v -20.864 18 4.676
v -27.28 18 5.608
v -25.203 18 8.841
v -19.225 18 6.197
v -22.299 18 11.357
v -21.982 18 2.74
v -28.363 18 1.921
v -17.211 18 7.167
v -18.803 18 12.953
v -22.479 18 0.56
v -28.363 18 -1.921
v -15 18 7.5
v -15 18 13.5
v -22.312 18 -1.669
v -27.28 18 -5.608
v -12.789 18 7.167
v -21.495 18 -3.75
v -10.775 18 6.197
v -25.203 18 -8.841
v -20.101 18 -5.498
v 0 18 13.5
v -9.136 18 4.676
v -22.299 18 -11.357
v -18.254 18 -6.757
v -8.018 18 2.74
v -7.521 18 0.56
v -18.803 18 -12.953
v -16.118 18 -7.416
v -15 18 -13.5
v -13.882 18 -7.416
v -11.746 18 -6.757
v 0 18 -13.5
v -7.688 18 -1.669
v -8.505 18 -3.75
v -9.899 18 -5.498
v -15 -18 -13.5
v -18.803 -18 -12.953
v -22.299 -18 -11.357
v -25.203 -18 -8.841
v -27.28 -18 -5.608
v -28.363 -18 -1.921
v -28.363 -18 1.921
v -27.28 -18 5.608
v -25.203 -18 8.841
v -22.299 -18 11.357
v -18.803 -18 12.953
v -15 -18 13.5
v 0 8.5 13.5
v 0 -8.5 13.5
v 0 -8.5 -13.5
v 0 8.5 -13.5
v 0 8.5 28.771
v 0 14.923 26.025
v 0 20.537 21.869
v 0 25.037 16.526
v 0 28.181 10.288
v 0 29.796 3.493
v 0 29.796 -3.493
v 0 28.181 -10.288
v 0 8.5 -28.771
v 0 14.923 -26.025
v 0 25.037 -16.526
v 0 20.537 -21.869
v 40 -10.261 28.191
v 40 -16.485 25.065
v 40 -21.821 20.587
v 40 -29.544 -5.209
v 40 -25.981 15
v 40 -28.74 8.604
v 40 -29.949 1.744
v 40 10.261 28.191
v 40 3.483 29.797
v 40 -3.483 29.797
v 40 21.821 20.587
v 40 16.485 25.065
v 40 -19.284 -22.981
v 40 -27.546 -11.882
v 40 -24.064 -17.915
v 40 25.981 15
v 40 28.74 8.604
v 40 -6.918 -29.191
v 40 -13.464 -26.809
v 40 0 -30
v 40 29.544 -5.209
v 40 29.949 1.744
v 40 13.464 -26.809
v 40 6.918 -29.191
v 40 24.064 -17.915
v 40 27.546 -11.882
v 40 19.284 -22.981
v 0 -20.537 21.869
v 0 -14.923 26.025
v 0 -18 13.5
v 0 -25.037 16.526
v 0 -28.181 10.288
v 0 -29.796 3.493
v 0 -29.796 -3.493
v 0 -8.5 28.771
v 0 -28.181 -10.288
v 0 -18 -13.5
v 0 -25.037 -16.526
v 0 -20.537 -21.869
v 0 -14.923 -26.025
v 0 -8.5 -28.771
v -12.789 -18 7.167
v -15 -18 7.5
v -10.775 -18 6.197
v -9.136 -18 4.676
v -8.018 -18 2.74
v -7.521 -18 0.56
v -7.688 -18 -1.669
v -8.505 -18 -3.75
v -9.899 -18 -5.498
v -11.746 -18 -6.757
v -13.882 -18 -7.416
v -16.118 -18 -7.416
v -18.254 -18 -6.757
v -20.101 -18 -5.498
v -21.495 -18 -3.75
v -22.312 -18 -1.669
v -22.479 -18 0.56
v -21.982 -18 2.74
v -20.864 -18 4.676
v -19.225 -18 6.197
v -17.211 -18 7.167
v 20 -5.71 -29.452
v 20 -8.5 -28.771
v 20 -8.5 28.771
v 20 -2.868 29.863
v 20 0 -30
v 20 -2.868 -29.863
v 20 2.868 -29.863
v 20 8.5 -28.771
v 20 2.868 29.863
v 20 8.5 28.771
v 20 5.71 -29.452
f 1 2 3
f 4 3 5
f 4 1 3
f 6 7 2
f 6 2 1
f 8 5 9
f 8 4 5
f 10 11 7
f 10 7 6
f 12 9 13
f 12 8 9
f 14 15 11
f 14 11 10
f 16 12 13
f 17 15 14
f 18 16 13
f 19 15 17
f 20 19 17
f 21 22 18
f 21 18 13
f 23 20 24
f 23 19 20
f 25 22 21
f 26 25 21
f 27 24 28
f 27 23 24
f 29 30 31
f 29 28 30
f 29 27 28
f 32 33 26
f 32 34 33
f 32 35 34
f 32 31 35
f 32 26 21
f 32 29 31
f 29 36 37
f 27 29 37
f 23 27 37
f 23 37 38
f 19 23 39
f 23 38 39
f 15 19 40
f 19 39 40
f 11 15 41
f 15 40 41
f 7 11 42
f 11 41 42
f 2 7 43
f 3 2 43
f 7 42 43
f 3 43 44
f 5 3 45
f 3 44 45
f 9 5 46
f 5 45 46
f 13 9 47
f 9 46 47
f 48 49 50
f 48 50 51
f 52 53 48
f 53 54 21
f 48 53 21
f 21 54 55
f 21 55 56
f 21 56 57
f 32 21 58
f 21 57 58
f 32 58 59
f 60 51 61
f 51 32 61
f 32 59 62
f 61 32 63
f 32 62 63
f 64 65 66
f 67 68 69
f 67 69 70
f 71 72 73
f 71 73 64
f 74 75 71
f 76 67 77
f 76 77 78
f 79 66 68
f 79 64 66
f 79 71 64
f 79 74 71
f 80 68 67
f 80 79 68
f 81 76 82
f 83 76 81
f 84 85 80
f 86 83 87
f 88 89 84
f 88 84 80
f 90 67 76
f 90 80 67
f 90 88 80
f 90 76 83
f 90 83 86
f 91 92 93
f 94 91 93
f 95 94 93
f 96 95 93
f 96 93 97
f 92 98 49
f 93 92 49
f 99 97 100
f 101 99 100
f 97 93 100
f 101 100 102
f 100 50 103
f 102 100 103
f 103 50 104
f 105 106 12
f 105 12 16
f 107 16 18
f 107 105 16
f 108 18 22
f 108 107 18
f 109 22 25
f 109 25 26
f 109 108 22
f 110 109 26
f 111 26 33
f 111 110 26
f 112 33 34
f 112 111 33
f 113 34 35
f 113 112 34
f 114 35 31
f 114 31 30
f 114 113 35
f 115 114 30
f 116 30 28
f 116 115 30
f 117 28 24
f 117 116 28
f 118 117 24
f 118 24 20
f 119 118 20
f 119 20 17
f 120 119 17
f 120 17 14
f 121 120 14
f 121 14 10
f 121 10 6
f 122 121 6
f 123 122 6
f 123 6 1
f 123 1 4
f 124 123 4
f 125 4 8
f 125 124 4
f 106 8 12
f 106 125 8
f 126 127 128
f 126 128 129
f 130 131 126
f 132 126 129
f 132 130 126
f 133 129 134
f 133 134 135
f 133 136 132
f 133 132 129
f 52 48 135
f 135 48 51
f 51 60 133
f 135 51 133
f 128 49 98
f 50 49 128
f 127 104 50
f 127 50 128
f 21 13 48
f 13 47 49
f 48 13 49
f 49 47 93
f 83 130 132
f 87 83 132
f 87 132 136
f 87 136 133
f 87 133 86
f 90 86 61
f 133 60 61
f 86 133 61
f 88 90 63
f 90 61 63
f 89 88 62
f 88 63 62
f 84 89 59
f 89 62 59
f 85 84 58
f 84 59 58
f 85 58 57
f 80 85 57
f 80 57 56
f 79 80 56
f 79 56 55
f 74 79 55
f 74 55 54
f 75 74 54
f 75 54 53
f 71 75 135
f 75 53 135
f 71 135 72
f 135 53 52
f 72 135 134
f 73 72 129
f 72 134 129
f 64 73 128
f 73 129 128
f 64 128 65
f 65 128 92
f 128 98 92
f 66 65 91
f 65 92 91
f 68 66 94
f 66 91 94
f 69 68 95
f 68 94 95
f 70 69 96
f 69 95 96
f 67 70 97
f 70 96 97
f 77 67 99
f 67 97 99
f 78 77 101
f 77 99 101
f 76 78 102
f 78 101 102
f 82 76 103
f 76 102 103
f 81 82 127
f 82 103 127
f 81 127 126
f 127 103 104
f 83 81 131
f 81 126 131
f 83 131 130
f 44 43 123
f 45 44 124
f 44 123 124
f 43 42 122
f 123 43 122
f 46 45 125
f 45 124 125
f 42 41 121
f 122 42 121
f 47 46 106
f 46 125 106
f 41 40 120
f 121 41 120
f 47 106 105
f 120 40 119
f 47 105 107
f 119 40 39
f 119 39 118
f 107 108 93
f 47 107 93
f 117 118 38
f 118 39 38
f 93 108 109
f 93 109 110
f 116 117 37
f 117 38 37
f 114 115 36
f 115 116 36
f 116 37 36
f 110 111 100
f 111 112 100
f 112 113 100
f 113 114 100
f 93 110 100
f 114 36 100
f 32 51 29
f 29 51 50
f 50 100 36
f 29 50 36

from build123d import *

# Parameters (mm, degrees)
SKETCH_1_R               = 30
EXTRUDE_1_DEPTH          = 40
EXTRUDE_2_DEPTH          = 18
EXTRUDE_2_DEPTH_BACK     = 18
SKETCH_2_R               = 7.5
CUT_EXTRUDE_1_DEPTH      = 59.309518948
CUT_EXTRUDE_1_DEPTH_BACK = 59.309518948
SKETCH_3_W               = 20
SKETCH_3_H               = 17


with BuildPart() as part:
    # Эскиз1 → Бобышка-Вытянуть1 (new body)
    with BuildSketch(Plane(origin=(0, 0, 0), x_dir=(0, 0, -1), z_dir=(1, 0, 0))):
        Circle(SKETCH_1_R)
    extrude(amount=EXTRUDE_1_DEPTH)

    # Эскиз2 → Бобышка-Вытянуть2 (add, two sides: drawn at the far end of the back side and taken through both)
    with BuildSketch(Plane(origin=(0, 0, 0), x_dir=(1, 0, 0), z_dir=(0, 1, 0)).offset(-EXTRUDE_2_DEPTH_BACK)):
        with BuildLine():
            Line((0, 13.5), (-15, 13.5))
            ThreePointArc((-15, 13.5), (-28.5, 0), (-15, -13.5))
            Line((-15, -13.5), (0, -13.5))
            Line((0, -13.5), (0, 13.5))
        make_face()
        with Locations((-15, 0)):
            Circle(SKETCH_2_R, mode=Mode.SUBTRACT)
    extrude(amount=EXTRUDE_2_DEPTH + EXTRUDE_2_DEPTH_BACK)

    # Эскиз3 → Вырез-Вытянуть1 (cut, two sides: drawn at the far end of the back side and taken through both)
    with BuildSketch(Plane.XY.offset(-CUT_EXTRUDE_1_DEPTH_BACK)):
        with Locations((10, 0)):
            Rectangle(SKETCH_3_W, SKETCH_3_H)
    extrude(amount=CUT_EXTRUDE_1_DEPTH + CUT_EXTRUDE_1_DEPTH_BACK, mode=Mode.SUBTRACT)


solid = part.part
